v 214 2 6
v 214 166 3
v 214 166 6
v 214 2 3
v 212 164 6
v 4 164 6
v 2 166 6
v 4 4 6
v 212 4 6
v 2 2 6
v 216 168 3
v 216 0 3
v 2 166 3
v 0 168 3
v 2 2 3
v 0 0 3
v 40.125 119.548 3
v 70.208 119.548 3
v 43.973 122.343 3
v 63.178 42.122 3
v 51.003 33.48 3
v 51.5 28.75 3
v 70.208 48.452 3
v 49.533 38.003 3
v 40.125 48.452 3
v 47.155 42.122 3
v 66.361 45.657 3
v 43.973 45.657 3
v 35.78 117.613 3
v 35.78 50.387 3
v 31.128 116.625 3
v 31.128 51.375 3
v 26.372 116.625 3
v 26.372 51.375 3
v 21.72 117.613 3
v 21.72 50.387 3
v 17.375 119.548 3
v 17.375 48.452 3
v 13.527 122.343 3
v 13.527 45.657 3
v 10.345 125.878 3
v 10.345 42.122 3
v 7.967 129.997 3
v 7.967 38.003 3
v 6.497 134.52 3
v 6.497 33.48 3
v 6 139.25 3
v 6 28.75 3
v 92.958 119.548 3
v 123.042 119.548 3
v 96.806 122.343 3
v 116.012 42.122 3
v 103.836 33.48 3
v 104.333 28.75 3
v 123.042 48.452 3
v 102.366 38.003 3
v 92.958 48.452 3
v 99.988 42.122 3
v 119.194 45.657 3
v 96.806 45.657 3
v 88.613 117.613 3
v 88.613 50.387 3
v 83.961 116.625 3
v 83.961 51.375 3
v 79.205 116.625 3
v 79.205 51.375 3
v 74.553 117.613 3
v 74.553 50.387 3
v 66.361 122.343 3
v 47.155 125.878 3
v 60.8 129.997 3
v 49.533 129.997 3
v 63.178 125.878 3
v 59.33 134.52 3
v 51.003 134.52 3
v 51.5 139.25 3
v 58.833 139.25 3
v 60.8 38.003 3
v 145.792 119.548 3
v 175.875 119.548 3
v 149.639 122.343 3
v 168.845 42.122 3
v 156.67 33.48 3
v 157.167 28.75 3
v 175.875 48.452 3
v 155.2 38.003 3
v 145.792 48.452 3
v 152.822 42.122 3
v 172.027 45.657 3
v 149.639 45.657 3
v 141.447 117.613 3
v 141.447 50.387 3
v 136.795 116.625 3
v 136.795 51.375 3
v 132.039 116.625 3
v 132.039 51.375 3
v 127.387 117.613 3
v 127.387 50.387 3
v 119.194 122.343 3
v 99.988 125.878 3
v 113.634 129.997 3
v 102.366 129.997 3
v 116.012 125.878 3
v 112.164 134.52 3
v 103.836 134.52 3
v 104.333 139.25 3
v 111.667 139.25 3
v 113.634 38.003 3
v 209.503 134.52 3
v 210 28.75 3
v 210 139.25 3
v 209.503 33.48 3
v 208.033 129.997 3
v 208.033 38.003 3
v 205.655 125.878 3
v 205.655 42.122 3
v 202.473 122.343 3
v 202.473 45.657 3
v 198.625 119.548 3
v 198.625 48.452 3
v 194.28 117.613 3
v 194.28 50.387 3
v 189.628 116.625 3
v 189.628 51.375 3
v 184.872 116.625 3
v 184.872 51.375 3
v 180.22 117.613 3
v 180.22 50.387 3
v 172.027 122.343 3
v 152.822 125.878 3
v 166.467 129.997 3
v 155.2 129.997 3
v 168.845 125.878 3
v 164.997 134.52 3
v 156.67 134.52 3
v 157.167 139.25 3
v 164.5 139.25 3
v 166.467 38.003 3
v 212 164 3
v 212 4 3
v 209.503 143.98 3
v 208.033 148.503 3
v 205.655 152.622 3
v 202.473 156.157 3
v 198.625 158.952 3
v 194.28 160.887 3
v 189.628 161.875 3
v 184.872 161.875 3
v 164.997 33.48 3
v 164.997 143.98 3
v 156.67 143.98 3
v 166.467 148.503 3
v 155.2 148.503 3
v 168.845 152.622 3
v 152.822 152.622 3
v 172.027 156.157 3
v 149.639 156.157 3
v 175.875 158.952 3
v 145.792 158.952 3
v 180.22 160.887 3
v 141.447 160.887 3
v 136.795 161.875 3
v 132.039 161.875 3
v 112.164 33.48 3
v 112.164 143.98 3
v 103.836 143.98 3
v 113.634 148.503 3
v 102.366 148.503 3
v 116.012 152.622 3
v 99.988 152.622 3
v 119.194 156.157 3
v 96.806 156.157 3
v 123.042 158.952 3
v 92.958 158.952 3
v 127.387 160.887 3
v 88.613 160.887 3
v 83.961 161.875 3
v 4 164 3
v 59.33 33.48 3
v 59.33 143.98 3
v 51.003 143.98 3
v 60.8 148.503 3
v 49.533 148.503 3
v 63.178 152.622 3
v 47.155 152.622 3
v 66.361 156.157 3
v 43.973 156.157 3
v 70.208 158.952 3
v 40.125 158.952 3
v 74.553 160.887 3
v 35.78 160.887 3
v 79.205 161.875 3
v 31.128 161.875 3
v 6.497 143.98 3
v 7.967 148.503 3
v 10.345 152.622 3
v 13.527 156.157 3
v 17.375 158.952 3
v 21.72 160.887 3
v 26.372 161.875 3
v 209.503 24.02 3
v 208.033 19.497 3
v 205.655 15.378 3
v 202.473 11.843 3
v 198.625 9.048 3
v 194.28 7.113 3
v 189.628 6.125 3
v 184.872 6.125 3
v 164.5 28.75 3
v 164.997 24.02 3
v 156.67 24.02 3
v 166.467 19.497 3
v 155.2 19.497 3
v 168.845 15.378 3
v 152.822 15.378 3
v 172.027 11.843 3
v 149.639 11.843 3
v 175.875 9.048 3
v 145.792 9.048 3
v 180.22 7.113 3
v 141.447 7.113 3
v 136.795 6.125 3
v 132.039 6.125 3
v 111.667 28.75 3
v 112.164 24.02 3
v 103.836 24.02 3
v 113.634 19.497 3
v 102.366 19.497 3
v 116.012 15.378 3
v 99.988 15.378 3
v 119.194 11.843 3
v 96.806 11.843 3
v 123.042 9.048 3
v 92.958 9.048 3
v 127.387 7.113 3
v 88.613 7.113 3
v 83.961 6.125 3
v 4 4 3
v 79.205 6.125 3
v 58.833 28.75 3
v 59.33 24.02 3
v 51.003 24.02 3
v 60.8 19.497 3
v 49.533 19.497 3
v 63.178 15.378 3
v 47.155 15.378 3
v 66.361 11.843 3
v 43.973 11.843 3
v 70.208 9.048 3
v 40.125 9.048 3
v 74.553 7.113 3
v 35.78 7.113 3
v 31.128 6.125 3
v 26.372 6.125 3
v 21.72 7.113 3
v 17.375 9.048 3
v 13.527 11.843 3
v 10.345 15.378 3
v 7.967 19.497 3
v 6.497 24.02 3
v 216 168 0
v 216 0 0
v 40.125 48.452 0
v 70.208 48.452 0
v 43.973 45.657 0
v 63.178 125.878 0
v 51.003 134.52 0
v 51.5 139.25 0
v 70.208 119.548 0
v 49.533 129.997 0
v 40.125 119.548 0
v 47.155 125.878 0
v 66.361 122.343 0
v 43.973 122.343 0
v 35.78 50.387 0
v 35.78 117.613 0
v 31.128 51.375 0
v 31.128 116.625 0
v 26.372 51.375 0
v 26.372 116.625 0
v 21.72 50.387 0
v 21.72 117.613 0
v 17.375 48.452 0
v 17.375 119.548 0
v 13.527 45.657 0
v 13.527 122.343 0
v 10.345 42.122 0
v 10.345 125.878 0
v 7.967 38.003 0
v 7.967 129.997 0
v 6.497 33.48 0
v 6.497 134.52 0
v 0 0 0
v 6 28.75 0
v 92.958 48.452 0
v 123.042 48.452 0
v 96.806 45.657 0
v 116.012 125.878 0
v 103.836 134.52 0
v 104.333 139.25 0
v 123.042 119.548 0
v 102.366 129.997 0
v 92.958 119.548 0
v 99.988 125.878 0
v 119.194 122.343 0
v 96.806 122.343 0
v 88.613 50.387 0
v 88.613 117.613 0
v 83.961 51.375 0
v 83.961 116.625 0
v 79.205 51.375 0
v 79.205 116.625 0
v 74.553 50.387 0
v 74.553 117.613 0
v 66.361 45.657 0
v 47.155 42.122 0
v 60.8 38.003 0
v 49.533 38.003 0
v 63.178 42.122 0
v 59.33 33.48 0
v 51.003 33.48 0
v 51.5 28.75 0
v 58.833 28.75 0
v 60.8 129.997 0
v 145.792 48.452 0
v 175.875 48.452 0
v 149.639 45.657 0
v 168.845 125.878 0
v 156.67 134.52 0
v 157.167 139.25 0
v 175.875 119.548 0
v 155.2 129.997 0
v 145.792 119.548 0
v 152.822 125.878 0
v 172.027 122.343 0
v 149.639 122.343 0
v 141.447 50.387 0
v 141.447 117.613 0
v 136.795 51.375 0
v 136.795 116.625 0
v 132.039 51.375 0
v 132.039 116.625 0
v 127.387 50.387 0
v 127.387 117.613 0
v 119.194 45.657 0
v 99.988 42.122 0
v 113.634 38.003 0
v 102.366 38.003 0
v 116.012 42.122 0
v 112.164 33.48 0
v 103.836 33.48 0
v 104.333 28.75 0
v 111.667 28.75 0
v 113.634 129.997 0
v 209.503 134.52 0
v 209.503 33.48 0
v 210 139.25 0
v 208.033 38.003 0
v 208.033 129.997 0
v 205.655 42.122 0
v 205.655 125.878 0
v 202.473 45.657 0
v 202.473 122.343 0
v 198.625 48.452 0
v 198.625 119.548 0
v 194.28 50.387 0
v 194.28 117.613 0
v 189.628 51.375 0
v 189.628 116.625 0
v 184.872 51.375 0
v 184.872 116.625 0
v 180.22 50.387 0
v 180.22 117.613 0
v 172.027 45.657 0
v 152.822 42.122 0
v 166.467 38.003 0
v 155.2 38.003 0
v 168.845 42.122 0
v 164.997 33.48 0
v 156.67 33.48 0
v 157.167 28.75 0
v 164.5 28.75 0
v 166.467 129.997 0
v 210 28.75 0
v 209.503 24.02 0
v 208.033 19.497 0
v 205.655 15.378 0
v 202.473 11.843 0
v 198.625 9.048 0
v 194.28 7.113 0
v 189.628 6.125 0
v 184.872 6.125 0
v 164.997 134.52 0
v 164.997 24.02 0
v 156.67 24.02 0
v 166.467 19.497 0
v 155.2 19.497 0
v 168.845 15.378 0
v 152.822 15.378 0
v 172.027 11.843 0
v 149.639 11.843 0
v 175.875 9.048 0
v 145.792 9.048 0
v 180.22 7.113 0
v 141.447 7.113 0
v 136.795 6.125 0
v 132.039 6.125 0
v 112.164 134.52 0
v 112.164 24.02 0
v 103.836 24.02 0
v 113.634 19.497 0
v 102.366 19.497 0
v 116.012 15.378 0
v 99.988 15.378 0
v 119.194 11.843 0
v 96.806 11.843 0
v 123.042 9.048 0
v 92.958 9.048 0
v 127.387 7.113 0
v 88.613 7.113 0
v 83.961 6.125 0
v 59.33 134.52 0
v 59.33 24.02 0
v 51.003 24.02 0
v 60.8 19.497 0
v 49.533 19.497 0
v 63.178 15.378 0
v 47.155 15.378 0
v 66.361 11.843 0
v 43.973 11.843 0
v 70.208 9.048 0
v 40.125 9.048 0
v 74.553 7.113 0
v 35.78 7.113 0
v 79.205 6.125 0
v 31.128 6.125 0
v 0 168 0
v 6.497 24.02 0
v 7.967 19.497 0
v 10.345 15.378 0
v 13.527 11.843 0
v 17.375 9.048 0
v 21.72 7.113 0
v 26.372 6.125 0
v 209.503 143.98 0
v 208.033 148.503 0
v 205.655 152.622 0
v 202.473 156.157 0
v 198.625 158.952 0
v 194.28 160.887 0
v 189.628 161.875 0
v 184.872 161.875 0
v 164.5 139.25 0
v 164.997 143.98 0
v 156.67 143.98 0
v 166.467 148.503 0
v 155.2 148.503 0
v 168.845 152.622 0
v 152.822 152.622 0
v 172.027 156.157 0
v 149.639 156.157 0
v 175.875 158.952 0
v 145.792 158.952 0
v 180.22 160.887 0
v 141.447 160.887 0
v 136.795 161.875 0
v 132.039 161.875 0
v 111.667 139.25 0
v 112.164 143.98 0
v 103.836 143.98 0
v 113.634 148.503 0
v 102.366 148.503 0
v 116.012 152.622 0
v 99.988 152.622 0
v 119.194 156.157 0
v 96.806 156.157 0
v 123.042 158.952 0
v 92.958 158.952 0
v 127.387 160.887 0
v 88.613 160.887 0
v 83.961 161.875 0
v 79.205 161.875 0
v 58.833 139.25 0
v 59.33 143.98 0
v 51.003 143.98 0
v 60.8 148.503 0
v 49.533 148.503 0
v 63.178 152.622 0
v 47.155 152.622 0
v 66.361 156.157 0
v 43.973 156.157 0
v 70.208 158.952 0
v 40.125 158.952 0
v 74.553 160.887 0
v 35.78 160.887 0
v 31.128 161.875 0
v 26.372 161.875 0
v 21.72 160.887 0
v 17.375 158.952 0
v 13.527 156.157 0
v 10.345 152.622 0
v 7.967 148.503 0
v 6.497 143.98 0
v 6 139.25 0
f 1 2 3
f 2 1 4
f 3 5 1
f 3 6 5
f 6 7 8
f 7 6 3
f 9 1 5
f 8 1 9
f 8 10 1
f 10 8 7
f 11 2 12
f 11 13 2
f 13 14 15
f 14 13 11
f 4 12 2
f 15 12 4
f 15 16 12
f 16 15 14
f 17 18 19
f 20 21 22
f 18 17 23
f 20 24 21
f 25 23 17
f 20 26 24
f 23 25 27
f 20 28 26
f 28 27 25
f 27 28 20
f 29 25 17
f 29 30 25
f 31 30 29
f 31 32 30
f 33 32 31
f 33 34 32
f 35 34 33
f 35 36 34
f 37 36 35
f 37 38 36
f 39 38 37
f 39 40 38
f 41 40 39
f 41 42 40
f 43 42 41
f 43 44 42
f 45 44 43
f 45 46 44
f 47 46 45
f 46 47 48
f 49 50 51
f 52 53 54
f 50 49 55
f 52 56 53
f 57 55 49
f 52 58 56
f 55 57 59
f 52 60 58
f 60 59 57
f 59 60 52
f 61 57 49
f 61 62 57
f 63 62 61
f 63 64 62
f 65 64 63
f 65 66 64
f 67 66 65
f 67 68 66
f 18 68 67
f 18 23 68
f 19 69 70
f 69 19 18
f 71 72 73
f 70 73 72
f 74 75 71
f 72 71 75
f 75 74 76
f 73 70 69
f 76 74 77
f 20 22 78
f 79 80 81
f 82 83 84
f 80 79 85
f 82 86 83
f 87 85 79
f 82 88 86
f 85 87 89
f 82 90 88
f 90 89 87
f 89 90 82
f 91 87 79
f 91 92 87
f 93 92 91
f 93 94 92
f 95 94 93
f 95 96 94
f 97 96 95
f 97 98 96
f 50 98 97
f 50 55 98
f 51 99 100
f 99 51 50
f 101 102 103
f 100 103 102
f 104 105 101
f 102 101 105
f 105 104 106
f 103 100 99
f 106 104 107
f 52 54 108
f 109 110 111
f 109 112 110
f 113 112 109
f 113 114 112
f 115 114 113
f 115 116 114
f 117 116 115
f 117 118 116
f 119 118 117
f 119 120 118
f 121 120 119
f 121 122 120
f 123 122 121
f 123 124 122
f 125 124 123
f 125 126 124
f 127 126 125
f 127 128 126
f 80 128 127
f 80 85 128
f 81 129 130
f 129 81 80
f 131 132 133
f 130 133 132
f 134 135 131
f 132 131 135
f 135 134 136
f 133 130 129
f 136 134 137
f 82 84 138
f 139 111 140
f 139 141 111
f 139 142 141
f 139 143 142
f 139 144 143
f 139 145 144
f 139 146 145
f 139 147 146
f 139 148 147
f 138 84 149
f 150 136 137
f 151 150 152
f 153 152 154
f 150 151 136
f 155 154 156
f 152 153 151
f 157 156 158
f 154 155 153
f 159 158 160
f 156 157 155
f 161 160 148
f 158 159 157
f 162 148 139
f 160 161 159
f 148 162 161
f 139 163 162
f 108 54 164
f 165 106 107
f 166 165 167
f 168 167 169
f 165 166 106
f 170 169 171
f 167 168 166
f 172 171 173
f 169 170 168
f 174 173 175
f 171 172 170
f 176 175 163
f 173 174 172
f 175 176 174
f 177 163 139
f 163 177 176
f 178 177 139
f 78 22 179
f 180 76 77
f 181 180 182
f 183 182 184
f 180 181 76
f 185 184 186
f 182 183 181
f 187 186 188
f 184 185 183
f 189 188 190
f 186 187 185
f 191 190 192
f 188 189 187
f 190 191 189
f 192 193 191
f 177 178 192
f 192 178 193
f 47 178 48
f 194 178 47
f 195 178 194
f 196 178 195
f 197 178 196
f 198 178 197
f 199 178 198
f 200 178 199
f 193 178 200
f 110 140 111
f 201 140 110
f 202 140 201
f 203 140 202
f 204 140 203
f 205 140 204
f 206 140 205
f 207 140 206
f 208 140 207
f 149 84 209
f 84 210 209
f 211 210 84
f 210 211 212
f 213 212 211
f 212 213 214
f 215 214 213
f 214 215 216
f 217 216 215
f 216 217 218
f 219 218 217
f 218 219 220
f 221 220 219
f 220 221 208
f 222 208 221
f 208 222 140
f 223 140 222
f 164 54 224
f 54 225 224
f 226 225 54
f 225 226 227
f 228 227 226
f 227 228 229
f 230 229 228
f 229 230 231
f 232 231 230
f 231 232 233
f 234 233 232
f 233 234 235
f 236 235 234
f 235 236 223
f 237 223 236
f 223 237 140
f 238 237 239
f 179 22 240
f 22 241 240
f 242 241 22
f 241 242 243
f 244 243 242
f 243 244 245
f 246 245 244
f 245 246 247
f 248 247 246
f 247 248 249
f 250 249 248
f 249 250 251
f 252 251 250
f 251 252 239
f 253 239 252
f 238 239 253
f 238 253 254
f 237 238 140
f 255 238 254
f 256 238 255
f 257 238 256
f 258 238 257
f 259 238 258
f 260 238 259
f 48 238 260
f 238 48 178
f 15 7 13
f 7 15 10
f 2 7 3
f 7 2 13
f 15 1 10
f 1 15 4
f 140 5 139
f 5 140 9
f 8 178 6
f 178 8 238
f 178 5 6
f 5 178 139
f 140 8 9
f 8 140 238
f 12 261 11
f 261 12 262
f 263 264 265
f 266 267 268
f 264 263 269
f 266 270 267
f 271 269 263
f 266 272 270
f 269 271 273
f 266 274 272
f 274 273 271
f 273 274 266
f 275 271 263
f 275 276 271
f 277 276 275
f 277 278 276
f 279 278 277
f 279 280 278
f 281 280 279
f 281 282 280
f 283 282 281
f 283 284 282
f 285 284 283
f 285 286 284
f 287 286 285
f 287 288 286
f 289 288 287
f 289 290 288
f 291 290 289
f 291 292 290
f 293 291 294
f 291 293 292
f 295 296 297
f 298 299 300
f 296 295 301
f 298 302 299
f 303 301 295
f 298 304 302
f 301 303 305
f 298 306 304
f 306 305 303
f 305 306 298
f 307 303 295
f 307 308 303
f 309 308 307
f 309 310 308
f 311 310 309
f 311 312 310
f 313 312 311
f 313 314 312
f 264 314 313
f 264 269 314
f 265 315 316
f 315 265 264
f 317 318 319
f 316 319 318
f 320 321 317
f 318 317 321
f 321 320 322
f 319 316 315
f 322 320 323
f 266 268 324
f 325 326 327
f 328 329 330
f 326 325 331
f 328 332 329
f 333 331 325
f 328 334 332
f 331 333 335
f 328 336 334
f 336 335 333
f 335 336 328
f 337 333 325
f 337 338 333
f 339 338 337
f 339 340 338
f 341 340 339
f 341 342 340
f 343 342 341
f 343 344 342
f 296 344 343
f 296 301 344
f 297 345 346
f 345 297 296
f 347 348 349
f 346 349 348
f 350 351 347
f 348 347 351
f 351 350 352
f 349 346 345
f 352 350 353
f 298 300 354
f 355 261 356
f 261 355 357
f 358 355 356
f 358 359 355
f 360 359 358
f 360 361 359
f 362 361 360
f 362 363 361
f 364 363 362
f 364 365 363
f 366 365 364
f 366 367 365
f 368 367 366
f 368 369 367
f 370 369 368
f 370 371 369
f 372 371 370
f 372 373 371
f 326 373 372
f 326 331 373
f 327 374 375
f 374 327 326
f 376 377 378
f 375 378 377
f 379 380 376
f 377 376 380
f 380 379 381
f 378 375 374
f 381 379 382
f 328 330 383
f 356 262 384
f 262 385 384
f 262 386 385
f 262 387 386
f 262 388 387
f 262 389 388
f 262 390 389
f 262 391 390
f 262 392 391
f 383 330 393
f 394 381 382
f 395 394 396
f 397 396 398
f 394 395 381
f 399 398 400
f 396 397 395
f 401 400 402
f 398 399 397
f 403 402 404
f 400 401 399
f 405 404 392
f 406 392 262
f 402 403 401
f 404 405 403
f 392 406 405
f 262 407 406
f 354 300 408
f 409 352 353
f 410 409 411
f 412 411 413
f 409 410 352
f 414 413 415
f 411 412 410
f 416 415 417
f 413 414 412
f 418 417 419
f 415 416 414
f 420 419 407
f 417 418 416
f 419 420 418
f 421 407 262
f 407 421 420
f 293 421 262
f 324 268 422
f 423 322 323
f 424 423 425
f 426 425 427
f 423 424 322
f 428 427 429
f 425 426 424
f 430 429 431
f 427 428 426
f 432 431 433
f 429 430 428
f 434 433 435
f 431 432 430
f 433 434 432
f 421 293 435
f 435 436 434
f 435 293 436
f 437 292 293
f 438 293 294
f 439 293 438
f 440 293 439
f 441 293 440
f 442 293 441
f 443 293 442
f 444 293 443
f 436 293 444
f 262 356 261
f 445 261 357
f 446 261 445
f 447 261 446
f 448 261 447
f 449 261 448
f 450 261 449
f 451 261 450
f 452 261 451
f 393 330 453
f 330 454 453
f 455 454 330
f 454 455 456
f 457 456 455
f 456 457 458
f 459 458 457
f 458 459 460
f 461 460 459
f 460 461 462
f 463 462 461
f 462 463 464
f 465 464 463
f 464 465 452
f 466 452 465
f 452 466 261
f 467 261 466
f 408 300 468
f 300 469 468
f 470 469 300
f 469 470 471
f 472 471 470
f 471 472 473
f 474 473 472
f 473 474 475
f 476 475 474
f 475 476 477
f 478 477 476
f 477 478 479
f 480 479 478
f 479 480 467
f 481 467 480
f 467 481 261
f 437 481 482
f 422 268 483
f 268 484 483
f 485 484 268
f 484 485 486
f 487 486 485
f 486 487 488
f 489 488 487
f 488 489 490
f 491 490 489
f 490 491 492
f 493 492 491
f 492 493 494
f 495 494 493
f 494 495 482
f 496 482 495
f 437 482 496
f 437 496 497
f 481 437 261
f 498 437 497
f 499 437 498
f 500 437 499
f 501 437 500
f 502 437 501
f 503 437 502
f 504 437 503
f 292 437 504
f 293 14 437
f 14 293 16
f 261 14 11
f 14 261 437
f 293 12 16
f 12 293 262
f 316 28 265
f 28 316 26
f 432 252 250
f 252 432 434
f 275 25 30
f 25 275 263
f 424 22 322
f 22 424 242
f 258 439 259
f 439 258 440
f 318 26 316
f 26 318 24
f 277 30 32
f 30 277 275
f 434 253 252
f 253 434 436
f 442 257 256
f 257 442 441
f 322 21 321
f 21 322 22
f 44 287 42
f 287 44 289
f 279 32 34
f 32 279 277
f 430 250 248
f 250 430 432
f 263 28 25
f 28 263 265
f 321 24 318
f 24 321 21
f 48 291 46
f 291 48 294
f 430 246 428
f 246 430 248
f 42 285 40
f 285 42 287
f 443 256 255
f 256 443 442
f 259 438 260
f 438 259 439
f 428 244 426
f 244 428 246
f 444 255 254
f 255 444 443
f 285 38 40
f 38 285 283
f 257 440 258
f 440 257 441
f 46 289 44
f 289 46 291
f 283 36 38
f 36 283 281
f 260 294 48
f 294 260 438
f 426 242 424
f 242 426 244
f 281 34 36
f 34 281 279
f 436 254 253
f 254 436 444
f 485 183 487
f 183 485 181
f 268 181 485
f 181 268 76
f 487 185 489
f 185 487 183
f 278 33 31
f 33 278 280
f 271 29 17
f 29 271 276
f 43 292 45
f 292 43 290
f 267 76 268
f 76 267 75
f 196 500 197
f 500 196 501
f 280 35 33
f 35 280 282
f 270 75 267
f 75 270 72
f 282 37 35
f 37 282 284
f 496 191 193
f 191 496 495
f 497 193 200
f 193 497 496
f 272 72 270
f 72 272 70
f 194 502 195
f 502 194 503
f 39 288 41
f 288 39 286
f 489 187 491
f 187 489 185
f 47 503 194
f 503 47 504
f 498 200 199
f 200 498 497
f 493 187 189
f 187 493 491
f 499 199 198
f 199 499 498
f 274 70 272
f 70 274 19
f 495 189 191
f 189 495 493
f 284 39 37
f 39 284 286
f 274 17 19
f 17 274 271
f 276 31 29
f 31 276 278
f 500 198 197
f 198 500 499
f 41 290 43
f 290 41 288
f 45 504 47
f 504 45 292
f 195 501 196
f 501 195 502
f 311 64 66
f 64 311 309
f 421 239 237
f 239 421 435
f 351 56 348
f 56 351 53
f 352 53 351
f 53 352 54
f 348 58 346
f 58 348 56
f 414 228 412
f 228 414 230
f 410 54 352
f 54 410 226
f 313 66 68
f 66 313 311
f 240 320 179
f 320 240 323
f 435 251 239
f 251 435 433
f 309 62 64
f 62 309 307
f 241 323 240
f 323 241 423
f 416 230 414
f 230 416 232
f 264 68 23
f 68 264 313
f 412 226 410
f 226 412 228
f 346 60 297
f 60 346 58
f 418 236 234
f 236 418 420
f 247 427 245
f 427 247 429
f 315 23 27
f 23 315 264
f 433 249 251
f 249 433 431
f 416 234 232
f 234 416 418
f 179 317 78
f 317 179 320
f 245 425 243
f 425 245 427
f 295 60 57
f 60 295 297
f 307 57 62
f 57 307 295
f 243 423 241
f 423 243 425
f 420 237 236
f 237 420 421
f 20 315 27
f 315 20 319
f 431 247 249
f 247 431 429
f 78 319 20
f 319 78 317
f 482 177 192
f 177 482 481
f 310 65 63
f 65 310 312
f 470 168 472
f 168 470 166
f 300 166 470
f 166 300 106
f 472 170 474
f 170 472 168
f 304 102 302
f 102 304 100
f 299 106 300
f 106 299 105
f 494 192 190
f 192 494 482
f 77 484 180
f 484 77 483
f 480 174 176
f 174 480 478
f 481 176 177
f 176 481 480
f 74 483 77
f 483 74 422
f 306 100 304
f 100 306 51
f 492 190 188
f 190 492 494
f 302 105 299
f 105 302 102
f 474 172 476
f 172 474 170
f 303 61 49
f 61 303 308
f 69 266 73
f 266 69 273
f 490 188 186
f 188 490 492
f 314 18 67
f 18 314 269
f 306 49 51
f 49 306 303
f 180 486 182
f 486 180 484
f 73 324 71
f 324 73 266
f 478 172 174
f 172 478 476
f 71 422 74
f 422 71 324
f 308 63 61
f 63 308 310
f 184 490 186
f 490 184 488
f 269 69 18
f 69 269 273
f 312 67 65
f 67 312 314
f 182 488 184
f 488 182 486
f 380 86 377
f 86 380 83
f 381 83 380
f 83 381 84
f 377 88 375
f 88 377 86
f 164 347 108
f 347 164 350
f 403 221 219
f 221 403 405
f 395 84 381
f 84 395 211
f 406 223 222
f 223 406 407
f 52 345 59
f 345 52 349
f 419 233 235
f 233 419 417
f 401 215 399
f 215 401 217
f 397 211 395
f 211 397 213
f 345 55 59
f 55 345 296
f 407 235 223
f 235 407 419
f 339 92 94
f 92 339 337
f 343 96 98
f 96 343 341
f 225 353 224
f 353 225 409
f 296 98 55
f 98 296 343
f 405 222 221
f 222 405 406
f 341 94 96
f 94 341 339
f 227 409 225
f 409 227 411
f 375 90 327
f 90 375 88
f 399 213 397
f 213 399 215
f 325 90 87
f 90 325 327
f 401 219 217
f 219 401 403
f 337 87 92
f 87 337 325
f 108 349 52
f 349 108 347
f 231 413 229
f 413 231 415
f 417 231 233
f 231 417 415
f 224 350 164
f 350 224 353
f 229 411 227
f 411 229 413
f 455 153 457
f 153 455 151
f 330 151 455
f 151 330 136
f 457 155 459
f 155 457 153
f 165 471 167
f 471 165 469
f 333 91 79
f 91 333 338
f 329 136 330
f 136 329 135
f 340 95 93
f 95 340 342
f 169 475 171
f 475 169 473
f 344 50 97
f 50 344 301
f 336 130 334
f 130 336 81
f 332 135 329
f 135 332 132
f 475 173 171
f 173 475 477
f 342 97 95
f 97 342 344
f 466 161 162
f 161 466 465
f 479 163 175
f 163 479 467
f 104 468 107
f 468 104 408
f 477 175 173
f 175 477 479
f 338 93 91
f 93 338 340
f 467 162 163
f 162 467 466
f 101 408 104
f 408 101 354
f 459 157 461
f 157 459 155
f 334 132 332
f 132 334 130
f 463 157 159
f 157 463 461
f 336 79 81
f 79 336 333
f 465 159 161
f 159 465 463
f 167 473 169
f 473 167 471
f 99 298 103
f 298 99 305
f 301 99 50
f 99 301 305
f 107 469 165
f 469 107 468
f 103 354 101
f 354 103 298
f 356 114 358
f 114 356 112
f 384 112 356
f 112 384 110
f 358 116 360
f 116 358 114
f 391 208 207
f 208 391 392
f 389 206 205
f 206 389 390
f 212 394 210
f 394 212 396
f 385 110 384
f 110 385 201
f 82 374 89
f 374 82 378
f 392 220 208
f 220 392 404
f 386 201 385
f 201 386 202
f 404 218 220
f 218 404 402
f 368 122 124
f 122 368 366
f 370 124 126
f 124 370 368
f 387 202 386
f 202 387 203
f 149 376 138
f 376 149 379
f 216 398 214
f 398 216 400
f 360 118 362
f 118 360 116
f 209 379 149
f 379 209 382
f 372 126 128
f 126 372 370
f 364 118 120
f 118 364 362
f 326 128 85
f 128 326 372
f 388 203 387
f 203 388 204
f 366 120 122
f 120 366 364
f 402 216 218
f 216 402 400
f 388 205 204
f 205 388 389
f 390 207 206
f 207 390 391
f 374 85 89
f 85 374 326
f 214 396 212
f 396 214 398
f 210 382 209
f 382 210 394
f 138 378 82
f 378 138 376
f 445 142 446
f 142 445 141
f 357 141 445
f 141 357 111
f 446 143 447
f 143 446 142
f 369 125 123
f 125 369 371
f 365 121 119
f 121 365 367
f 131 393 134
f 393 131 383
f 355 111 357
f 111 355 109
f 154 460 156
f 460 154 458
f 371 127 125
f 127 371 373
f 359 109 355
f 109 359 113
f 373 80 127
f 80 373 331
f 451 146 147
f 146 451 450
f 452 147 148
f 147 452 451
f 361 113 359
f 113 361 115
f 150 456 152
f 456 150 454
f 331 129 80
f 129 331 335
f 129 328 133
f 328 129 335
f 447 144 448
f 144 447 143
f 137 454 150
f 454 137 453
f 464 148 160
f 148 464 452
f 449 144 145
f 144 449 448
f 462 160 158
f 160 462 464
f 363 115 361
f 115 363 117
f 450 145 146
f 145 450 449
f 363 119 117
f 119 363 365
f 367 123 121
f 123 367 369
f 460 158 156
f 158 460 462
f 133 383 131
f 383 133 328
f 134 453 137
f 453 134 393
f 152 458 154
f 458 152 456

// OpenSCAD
// Parameters


/* [Advance Variables] */
cube_length = 216; 
cube_width = 168;   
cube_thickness = 3; 

sc_offset = 2;
sc_height = 3 ;
hollow_offset = 2 * sc_offset;

sc_length = cube_length - sc_offset; //small cube
sc_width = cube_width - sc_offset;   
sc_thickness = cube_thickness - sc_offset; 


cylinder_diameter = 45.5; // Diameter of the cylinders
cylinder_height = cube_thickness; // Height of the cylinders, same as cube thickness
cylinder_spacing = 5.5; // Spacing between the cylinders
cylinder_count_x = 4; // Number of cylinders in the X direction
cylinder_count_y = 2; // Number of cylinders in the Y direction
cylinder_offset = 6; // Offset from the cube's sides



// Calculate spacing needed inside the cube
spacing_x = (cube_length - 2 * cylinder_offset - cylinder_diameter) / (cylinder_count_x - 1);
spacing_y = (cube_width - 2 * cylinder_offset - cylinder_diameter) / (cylinder_count_y - 1);

// Create the main cube


 
difference()  {
    
    union(){
    cube([cube_length,cube_width, cube_thickness]); // big boi
        union(){
          difference()  {
            translate([sc_offset,sc_offset,cube_thickness])
             cube([cube_length - 2*sc_offset,cube_width - 2*sc_offset, sc_height]); // small boi
                 
             translate([hollow_offset,hollow_offset,cube_thickness]) 
             cube([cube_length - 2*hollow_offset,cube_width - 2*hollow_offset, sc_height]);
                        }
               }  
           }
      
     // Create a grid of cylinders
     for (i = [0:cylinder_count_x - 1]) {
        for (j = [0:cylinder_count_y - 1]) {
            x = i * spacing_x + cylinder_offset + cylinder_diameter / 2;
            y = j * spacing_y + cylinder_offset + cylinder_diameter / 2;
            translate([x, y, 0])
            cylinder(cube_thickness+sc_height, cylinder_diameter / 2, cylinder_diameter / 2);
        

        
                                            }
   
                                         } 
              }
              
